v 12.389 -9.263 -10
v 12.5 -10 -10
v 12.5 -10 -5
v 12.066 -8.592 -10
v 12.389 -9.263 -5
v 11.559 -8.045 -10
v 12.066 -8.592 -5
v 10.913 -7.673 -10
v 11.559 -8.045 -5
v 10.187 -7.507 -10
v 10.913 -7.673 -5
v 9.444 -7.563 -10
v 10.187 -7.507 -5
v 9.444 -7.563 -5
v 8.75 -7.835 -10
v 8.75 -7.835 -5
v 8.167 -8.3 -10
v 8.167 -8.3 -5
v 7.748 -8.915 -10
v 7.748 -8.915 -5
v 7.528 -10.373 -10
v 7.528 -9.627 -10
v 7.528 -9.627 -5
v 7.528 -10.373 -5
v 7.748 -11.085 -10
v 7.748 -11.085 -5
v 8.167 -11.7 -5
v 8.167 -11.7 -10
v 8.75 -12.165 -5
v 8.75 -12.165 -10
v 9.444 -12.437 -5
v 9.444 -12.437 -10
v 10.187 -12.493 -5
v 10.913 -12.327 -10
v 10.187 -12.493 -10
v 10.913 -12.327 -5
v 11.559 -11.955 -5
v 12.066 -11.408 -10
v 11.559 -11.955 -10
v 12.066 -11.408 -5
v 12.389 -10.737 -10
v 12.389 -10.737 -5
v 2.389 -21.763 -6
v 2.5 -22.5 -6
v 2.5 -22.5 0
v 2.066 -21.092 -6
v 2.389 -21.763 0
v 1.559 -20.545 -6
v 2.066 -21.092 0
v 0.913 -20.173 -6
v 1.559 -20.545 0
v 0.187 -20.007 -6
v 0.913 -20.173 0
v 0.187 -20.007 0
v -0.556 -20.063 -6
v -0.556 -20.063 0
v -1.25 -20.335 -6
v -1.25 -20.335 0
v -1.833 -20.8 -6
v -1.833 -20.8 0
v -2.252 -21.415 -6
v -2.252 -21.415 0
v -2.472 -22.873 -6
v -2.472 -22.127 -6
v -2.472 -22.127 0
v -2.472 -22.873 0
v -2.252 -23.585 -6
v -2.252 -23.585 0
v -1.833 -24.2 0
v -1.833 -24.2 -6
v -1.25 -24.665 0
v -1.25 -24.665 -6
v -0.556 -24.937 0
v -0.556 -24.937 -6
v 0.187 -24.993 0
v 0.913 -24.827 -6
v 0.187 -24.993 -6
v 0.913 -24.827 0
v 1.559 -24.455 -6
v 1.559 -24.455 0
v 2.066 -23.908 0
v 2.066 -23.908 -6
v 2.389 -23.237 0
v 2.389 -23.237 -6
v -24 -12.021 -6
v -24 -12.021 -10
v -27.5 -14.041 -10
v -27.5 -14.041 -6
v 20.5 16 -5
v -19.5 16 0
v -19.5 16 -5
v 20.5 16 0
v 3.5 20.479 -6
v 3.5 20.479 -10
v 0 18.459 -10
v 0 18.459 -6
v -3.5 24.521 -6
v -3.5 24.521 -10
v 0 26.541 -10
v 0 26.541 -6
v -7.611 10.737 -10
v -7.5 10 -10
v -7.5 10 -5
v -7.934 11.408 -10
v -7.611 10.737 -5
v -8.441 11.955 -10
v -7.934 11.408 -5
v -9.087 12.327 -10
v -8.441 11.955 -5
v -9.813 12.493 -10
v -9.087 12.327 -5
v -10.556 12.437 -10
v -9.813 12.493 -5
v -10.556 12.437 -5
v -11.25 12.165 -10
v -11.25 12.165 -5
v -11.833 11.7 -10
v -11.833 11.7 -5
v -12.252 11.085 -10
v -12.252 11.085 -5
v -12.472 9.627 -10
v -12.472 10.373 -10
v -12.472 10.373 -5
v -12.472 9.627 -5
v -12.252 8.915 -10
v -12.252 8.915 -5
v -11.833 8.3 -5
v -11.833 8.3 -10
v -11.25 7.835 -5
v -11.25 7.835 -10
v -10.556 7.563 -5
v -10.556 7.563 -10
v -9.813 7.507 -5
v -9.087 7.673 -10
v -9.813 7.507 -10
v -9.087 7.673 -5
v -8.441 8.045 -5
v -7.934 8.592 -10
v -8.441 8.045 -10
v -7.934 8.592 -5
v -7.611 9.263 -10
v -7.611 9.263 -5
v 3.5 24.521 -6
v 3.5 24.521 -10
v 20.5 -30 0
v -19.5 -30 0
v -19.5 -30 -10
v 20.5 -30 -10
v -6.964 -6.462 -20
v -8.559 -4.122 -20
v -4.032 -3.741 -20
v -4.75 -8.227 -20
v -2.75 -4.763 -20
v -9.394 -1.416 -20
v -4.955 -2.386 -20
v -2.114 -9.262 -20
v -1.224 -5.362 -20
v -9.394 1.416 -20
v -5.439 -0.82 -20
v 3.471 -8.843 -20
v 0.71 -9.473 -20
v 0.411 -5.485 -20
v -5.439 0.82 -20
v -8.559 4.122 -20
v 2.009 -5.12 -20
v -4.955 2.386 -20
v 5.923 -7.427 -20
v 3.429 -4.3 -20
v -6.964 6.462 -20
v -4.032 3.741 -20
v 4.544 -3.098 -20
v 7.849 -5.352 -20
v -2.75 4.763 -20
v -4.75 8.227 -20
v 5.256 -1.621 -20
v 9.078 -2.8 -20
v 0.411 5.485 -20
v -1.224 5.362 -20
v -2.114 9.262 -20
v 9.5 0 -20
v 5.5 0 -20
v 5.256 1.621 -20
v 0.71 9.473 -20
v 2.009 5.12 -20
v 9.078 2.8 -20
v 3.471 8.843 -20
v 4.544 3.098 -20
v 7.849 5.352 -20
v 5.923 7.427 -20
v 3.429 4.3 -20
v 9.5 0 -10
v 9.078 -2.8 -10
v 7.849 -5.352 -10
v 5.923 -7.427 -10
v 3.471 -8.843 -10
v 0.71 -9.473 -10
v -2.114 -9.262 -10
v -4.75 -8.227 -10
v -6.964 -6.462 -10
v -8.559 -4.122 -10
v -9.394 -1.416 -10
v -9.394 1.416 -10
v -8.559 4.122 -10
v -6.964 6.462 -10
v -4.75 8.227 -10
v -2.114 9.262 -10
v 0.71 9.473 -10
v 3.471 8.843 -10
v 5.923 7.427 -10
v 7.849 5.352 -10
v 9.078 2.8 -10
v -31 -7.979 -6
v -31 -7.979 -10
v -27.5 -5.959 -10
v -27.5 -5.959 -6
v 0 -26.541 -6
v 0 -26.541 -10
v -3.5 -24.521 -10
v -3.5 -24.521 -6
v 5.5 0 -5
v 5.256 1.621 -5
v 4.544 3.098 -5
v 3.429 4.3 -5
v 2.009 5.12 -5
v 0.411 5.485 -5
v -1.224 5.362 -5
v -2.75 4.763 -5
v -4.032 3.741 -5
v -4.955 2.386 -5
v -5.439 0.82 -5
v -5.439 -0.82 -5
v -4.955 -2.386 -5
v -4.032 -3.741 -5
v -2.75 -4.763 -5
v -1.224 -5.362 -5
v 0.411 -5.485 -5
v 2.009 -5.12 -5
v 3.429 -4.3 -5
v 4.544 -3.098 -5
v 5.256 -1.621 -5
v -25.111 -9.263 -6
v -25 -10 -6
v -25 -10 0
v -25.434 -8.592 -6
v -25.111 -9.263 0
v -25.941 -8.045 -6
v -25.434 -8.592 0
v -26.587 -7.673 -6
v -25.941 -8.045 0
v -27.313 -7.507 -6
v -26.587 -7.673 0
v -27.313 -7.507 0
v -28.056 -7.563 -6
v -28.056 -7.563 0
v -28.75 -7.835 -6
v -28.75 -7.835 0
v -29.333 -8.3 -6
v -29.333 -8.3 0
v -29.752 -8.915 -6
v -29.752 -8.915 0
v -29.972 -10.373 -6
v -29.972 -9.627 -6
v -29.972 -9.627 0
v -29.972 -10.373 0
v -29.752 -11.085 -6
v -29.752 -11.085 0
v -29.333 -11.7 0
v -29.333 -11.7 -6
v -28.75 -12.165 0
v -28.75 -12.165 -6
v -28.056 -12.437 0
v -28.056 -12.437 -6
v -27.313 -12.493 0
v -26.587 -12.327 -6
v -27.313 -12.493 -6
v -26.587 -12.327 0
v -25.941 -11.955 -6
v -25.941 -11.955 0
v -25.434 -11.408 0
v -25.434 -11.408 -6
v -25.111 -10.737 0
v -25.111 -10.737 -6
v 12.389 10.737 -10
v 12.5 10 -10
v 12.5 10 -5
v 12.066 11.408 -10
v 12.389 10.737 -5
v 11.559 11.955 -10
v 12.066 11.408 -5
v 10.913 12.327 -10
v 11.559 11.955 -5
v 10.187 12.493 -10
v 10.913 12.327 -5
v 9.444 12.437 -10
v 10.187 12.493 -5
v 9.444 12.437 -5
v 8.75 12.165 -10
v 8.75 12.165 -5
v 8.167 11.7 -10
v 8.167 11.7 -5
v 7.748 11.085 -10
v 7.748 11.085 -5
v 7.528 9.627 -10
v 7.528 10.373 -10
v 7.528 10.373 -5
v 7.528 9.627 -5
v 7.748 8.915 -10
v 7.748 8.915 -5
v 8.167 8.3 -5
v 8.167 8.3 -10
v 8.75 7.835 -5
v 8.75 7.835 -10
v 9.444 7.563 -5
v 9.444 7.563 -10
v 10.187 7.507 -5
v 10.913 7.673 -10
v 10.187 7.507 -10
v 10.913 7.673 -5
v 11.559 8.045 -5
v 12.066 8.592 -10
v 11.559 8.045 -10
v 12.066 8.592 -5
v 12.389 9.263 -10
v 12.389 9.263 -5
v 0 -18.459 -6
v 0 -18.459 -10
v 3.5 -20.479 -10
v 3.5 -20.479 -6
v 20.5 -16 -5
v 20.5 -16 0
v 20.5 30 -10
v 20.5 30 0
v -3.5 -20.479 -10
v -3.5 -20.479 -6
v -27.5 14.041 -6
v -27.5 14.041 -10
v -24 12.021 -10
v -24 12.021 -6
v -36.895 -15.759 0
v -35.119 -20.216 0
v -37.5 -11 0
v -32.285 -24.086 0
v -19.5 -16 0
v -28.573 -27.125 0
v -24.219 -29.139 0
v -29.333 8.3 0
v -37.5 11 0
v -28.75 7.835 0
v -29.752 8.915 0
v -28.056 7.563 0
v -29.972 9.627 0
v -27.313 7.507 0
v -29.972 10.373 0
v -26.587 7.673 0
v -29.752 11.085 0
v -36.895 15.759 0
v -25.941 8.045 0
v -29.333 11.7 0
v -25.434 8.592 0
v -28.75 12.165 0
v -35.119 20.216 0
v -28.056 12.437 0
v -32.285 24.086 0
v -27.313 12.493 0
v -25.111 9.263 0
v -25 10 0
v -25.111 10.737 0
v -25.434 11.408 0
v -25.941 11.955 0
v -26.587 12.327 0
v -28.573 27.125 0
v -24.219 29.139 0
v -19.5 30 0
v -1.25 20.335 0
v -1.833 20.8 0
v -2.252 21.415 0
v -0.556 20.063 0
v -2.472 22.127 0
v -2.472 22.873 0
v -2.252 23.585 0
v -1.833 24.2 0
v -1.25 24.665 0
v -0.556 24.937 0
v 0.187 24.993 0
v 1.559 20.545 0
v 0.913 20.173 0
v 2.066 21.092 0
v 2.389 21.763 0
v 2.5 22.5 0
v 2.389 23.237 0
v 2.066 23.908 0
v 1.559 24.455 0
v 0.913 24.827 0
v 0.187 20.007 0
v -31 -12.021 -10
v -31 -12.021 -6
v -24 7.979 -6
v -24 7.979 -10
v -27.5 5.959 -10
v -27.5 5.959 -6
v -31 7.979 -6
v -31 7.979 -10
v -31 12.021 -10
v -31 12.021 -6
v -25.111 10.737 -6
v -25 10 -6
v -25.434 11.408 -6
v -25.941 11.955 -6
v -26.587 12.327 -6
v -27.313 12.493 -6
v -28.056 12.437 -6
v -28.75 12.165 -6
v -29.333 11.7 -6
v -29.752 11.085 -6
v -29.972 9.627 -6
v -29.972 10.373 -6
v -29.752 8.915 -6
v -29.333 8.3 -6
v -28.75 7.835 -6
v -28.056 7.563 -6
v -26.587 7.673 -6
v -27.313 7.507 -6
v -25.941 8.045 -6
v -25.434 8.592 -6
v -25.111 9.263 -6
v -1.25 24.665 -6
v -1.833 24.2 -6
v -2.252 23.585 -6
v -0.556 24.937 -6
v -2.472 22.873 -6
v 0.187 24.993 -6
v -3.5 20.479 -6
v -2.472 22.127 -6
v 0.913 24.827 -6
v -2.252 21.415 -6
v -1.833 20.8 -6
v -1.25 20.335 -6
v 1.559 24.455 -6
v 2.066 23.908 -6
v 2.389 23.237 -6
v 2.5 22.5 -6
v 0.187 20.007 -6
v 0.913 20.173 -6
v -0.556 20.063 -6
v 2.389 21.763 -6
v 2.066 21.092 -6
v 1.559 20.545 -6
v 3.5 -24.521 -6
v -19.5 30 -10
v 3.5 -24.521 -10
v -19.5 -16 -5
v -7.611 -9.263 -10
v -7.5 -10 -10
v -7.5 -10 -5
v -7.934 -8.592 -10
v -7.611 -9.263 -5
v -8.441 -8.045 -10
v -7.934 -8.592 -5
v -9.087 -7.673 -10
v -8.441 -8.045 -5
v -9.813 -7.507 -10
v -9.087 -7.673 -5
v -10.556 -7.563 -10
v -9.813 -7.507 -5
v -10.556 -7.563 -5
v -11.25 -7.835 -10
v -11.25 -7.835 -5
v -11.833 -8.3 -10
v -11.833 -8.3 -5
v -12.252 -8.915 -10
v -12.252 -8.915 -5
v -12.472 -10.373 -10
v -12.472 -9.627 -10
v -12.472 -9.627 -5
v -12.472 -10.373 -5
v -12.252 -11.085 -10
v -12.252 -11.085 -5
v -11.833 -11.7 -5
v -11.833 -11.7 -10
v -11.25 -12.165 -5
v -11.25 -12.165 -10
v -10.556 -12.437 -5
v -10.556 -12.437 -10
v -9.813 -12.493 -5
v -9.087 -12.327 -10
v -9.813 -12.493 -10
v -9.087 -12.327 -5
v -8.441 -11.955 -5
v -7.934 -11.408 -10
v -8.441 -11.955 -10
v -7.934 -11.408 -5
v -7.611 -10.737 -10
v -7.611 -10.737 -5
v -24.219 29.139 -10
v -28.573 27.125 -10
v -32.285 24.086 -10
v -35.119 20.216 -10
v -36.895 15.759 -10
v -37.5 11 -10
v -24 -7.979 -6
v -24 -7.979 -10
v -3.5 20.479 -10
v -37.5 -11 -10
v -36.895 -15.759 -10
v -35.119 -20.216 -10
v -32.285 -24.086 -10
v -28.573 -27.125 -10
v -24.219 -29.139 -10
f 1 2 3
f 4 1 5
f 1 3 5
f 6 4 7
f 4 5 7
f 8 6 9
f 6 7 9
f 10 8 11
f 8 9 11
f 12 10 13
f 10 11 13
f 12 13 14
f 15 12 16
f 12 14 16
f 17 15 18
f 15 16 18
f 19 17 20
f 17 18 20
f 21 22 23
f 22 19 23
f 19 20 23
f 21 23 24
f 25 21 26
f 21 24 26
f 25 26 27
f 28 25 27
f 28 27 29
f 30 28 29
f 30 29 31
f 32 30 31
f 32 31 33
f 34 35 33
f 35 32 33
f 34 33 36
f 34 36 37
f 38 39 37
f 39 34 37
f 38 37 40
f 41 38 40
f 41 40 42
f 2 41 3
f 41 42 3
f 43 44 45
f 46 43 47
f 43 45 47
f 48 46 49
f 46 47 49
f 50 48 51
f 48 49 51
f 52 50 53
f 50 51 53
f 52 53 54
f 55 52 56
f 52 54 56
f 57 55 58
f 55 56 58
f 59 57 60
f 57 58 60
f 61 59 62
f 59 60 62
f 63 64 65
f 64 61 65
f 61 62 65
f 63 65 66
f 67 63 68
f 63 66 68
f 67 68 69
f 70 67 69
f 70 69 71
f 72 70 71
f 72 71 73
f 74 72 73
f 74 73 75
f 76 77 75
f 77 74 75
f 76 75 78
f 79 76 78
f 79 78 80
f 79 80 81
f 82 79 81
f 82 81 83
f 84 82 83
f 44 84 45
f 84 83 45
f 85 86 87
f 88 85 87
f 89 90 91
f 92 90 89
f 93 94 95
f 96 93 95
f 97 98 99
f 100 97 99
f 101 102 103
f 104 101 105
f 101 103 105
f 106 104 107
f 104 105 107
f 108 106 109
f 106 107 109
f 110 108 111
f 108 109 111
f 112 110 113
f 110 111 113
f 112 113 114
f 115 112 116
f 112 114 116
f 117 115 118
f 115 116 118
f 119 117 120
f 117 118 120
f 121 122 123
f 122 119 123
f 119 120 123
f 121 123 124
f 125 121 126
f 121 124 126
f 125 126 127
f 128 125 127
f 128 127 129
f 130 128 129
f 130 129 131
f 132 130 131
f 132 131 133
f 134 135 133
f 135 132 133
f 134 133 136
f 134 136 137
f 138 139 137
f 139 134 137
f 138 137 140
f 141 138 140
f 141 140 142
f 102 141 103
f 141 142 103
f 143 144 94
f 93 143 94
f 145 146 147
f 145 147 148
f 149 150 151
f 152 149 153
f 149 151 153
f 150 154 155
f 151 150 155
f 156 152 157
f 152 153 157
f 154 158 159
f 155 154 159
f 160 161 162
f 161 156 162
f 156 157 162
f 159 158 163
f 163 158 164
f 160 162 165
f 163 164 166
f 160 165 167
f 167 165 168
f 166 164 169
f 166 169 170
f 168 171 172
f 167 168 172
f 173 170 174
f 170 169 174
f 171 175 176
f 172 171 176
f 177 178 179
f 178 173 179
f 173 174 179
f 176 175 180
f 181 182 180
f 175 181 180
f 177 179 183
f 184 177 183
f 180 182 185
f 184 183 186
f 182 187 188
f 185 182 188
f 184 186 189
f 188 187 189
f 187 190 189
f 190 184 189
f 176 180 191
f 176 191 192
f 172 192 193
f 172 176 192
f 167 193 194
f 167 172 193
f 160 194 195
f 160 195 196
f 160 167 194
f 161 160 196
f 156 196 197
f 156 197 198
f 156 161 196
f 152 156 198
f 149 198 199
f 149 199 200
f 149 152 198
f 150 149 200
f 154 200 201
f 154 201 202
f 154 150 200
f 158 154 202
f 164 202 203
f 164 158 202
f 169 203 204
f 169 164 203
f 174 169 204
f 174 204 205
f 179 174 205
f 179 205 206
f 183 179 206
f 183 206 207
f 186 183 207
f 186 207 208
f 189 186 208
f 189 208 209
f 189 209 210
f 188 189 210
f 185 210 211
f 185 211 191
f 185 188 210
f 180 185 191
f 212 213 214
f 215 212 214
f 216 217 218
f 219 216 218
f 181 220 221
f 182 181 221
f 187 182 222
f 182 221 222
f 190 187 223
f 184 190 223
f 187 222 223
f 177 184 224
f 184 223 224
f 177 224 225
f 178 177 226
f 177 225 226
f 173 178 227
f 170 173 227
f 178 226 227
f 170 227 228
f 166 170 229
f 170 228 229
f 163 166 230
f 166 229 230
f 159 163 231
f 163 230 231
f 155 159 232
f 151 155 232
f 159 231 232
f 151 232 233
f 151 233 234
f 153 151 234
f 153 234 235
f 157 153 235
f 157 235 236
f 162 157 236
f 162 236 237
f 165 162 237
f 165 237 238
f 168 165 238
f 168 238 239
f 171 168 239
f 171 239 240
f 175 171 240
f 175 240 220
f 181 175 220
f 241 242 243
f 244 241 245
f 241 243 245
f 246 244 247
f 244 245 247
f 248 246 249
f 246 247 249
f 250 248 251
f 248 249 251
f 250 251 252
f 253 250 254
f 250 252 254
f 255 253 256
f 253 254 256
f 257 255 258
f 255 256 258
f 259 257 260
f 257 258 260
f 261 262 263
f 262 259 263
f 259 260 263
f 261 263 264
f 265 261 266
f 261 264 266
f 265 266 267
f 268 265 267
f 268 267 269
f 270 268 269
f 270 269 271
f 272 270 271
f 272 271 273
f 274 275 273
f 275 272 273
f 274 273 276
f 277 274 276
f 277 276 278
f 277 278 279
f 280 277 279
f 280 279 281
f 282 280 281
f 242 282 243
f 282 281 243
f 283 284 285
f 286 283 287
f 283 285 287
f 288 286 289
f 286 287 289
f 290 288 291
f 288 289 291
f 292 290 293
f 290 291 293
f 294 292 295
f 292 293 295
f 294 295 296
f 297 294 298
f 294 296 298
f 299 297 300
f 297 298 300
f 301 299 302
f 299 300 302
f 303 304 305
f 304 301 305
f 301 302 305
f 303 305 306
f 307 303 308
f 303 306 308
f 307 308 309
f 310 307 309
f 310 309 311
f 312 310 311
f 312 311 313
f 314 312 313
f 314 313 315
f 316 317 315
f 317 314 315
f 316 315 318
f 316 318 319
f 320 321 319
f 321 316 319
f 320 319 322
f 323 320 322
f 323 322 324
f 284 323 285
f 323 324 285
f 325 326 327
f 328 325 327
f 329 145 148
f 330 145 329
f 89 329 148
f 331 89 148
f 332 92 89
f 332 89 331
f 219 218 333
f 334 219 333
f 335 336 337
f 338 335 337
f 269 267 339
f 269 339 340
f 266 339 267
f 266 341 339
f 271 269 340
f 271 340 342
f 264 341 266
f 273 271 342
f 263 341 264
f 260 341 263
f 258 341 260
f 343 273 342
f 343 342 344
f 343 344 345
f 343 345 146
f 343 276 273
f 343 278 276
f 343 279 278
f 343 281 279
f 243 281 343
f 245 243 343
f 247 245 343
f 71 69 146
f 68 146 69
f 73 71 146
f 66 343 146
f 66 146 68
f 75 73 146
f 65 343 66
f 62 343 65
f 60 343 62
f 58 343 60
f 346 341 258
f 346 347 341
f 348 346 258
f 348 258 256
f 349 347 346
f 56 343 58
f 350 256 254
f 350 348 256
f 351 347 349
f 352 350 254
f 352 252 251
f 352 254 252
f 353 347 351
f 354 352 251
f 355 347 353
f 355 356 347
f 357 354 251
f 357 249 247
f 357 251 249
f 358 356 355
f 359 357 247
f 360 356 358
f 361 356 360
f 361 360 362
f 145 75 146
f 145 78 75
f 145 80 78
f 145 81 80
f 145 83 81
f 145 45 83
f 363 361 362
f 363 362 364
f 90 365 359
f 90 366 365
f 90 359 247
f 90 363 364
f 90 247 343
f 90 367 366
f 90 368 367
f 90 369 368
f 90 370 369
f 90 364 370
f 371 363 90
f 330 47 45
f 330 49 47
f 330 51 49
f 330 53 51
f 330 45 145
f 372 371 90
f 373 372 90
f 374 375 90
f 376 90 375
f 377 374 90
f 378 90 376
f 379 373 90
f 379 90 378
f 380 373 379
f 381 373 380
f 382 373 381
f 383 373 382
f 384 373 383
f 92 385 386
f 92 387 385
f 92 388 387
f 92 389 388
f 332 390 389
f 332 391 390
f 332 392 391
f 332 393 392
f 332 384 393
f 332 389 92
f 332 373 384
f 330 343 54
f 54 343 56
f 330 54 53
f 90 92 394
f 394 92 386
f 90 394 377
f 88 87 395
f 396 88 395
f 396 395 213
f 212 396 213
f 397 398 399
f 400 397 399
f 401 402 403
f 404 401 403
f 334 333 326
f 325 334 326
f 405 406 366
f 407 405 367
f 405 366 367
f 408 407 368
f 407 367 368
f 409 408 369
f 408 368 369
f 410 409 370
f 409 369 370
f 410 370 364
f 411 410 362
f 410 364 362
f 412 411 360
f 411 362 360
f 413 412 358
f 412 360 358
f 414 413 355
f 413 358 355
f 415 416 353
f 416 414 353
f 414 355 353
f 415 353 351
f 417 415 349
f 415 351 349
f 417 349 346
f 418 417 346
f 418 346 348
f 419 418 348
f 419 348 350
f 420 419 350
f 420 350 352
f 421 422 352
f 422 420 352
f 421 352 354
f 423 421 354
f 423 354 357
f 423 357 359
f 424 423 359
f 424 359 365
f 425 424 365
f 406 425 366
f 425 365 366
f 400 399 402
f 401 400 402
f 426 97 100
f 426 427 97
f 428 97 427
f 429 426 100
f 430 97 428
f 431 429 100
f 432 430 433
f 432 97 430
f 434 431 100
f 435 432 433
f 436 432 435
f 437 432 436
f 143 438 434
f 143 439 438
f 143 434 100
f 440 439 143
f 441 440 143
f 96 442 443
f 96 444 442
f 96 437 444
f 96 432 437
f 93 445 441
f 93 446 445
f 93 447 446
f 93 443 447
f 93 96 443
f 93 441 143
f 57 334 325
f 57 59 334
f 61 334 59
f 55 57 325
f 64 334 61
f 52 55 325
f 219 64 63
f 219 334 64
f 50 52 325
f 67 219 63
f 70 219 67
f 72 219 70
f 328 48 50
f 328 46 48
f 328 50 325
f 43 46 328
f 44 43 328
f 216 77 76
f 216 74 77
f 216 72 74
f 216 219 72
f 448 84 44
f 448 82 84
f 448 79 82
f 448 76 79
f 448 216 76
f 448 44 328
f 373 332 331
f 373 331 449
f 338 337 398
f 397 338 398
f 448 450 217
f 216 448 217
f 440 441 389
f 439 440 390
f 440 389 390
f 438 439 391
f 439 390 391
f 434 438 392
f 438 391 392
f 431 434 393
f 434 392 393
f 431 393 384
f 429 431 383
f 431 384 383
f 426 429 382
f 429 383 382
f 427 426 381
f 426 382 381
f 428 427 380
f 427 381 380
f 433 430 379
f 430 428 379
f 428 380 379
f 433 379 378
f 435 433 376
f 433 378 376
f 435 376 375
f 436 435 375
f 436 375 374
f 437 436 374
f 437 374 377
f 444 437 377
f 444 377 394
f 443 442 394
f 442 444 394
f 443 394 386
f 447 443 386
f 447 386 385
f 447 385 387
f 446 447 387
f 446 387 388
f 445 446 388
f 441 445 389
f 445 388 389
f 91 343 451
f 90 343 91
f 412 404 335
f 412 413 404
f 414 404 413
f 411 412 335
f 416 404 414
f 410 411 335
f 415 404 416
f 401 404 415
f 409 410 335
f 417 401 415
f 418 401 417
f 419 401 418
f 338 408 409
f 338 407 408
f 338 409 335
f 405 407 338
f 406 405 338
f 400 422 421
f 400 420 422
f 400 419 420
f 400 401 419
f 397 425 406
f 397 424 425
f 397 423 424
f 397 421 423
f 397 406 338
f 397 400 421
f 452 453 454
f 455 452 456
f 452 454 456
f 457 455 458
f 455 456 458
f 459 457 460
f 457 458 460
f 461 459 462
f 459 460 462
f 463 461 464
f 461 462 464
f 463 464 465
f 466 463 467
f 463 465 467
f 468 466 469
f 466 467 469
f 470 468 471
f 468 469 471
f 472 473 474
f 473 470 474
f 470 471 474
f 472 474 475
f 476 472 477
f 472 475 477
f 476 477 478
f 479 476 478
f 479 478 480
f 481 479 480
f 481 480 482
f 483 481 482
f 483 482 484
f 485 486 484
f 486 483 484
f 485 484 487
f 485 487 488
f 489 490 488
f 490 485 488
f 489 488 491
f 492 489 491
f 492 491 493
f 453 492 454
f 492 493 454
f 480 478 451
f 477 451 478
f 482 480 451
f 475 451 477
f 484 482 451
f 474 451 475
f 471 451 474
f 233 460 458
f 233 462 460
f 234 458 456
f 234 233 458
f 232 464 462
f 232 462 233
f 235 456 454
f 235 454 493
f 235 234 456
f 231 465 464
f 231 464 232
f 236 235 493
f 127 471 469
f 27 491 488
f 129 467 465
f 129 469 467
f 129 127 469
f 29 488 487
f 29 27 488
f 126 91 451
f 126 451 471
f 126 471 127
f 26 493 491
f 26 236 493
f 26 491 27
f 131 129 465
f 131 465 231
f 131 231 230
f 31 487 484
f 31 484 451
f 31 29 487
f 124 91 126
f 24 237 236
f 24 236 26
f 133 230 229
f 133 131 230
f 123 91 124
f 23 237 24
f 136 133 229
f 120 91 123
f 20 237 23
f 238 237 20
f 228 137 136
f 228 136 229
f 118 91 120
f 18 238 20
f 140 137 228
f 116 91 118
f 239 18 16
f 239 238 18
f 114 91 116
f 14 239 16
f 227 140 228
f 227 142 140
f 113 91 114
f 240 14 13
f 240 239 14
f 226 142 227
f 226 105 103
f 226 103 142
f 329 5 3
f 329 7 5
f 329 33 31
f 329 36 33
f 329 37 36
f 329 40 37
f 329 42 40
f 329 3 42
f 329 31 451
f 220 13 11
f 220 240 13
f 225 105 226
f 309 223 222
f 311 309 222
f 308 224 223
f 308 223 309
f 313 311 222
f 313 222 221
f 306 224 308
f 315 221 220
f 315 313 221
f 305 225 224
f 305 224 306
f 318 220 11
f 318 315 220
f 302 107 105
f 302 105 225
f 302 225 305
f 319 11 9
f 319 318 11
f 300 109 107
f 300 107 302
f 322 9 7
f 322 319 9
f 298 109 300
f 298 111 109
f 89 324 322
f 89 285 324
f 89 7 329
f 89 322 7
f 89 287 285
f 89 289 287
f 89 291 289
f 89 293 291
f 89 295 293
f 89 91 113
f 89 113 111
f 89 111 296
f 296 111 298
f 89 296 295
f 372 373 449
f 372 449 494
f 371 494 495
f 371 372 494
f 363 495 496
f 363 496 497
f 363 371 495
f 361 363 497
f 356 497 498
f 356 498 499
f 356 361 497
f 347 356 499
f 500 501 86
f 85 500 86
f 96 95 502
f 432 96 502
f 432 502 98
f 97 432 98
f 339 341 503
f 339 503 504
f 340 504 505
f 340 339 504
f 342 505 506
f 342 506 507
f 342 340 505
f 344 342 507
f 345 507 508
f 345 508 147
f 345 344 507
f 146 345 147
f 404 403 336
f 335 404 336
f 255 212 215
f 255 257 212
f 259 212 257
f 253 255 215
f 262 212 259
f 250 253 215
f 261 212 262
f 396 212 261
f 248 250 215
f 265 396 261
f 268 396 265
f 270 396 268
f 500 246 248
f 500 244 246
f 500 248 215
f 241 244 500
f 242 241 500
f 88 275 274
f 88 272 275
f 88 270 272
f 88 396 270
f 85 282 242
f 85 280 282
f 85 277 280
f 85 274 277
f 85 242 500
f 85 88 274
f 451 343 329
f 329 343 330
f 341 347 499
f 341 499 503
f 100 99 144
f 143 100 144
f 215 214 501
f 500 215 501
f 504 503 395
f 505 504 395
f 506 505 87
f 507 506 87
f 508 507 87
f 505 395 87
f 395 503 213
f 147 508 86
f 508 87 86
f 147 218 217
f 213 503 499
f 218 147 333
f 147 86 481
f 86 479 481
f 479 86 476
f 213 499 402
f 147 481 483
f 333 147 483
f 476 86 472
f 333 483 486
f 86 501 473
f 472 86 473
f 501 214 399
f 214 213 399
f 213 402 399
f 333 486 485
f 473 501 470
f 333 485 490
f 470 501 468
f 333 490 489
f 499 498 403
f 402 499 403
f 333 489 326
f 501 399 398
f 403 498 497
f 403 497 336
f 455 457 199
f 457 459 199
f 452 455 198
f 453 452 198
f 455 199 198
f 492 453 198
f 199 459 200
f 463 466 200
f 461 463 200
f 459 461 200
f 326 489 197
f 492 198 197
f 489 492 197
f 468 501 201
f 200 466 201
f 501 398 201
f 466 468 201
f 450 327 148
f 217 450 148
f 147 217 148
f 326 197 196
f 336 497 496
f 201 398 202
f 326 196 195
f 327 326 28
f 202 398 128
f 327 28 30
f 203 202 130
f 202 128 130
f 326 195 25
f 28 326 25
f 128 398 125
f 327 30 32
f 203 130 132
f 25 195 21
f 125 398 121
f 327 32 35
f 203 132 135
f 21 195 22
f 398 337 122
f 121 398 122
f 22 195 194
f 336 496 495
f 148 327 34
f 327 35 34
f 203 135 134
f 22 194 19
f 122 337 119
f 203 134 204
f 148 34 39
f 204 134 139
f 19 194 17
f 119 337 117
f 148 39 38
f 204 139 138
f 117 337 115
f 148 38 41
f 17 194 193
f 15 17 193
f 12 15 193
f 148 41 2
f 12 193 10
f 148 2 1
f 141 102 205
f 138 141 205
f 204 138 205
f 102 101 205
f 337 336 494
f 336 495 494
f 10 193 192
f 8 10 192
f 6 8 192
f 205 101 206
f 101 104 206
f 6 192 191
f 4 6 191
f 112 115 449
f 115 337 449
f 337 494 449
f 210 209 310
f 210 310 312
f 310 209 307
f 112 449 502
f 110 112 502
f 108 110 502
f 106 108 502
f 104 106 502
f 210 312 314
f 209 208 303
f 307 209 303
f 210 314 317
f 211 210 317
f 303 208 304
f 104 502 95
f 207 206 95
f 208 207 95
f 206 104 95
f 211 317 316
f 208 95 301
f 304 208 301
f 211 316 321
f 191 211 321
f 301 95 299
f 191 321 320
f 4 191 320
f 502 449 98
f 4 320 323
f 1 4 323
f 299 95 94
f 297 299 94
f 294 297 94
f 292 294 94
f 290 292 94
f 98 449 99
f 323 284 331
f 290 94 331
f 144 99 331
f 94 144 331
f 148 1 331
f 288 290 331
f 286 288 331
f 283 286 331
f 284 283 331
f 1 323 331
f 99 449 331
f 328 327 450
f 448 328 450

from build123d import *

# Parameters (mm, degrees)
F0_W     = 40
F0_H     = 32
F0_R     = 2.5
F0_R_2   = 5.5
F1_DEPTH = 20
F2_DEPTH = 10
F3_R     = 2.5
F4_DEPTH = 4
F5_W     = 40
F5_H     = 32
F5_R     = 2.5
F5_R_2   = 9.5
F6_DEPTH = 10
F7_DEPTH = 5


with BuildPart() as f1:
    # F0 (on Top) → F1 (new body)
    with BuildSketch(Plane.XY):
        with Locations((0.5, 0)):
            Rectangle(F0_W, F0_H)
        with Locations((-10, -10)):
            Circle(F0_R, mode=Mode.SUBTRACT)
        with Locations((10, -10)):
            Circle(F0_R, mode=Mode.SUBTRACT)
        with Locations((-10, 10)):
            Circle(F0_R, mode=Mode.SUBTRACT)
        Circle(F0_R_2, mode=Mode.SUBTRACT)
        with Locations((10, 10)):
            Circle(F0_R, mode=Mode.SUBTRACT)
    extrude(amount=-F1_DEPTH)

    # F0 (on Top) → F2 (join)
    with BuildSketch(Plane.XY):
        with BuildLine():
            ThreePointArc((-19.5, 30), (-32.285489, 24.086252), (-37.5, 11))
            Line((-37.5, 11), (-37.5, -11))
            ThreePointArc((-37.5, -11), (-32.285489, -24.086252), (-19.5, -30))
            Line((-19.5, -30), (20.5, -30))
            Line((20.5, -30), (20.5, -16))
            Line((20.5, -16), (-19.5, -16))
            Line((-19.5, -16), (-19.5, 16))
            Line((-19.5, 16), (20.5, 16))
            Line((20.5, 16), (20.5, 30))
            Line((20.5, 30), (-19.5, 30))
        make_face()
        with Locations((-27.5, -10)):
            Circle(F0_R, mode=Mode.SUBTRACT)
        with Locations((0, -22.5)):
            Circle(F0_R, mode=Mode.SUBTRACT)
        with Locations((-27.5, 10)):
            Circle(F0_R, mode=Mode.SUBTRACT)
        with Locations((0, 22.5)):
            Circle(F0_R, mode=Mode.SUBTRACT)
    extrude(amount=-F2_DEPTH)

    # F3 (on face) → F4 (cut)
    with BuildSketch(Plane(origin=(0, 0, -10), x_dir=(1, 0, 0), z_dir=(0, 0, -1))):
        Polygon((3.5, 20.479274), (3.5, 24.520726), (0, 26.541452), (-3.5, 24.520726), (-3.5, 20.479274), (0, 18.458548), align=None)
        with Locations((0, 22.5)):
            Circle(F3_R, mode=Mode.SUBTRACT)
        Polygon((-24, 7.979274), (-24, 12.020726), (-27.5, 14.041452), (-31, 12.020726), (-31, 7.979274), (-27.5, 5.958548), align=None)
        with Locations((-27.5, 10)):
            Circle(F3_R, mode=Mode.SUBTRACT)
        Polygon((3.5, -24.520726), (3.5, -20.479274), (0, -18.458548), (-3.5, -20.479274), (-3.5, -24.520726), (0, -26.541452), align=None)
        with Locations((0, -22.5)):
            Circle(F3_R, mode=Mode.SUBTRACT)
        Polygon((-24, -12.020726), (-24, -7.979274), (-27.5, -5.958548), (-31, -7.979274), (-31, -12.020726), (-27.5, -14.041452), align=None)
        with Locations((-27.5, -10)):
            Circle(F3_R, mode=Mode.SUBTRACT)
    extrude(amount=-F4_DEPTH, mode=Mode.SUBTRACT)

    # F5 (on face) → F6 (cut)
    with BuildSketch(Plane(origin=(0, 0, -20), x_dir=(1, 0, 0), z_dir=(0, 0, -1))):
        with Locations((0.5, 0)):
            Rectangle(F5_W, F5_H)
        with Locations((-10, -10)):
            Circle(F5_R, mode=Mode.SUBTRACT)
        with Locations((10, -10)):
            Circle(F5_R, mode=Mode.SUBTRACT)
        Circle(F5_R_2, mode=Mode.SUBTRACT)
        with Locations((-10, 10)):
            Circle(F5_R, mode=Mode.SUBTRACT)
        with Locations((10, 10)):
            Circle(F5_R, mode=Mode.SUBTRACT)
    extrude(amount=-F6_DEPTH, mode=Mode.SUBTRACT)

    # F0 (on Top) → F7 (cut)
    with BuildSketch(Plane.XY):
        with Locations((0.5, 0)):
            Rectangle(F0_W, F0_H)
        with Locations((-10, -10)):
            Circle(F0_R, mode=Mode.SUBTRACT)
        with Locations((10, -10)):
            Circle(F0_R, mode=Mode.SUBTRACT)
        with Locations((-10, 10)):
            Circle(F0_R, mode=Mode.SUBTRACT)
        Circle(F0_R_2, mode=Mode.SUBTRACT)
        with Locations((10, 10)):
            Circle(F0_R, mode=Mode.SUBTRACT)
    extrude(amount=-F7_DEPTH, mode=Mode.SUBTRACT)


solid = f1.part
